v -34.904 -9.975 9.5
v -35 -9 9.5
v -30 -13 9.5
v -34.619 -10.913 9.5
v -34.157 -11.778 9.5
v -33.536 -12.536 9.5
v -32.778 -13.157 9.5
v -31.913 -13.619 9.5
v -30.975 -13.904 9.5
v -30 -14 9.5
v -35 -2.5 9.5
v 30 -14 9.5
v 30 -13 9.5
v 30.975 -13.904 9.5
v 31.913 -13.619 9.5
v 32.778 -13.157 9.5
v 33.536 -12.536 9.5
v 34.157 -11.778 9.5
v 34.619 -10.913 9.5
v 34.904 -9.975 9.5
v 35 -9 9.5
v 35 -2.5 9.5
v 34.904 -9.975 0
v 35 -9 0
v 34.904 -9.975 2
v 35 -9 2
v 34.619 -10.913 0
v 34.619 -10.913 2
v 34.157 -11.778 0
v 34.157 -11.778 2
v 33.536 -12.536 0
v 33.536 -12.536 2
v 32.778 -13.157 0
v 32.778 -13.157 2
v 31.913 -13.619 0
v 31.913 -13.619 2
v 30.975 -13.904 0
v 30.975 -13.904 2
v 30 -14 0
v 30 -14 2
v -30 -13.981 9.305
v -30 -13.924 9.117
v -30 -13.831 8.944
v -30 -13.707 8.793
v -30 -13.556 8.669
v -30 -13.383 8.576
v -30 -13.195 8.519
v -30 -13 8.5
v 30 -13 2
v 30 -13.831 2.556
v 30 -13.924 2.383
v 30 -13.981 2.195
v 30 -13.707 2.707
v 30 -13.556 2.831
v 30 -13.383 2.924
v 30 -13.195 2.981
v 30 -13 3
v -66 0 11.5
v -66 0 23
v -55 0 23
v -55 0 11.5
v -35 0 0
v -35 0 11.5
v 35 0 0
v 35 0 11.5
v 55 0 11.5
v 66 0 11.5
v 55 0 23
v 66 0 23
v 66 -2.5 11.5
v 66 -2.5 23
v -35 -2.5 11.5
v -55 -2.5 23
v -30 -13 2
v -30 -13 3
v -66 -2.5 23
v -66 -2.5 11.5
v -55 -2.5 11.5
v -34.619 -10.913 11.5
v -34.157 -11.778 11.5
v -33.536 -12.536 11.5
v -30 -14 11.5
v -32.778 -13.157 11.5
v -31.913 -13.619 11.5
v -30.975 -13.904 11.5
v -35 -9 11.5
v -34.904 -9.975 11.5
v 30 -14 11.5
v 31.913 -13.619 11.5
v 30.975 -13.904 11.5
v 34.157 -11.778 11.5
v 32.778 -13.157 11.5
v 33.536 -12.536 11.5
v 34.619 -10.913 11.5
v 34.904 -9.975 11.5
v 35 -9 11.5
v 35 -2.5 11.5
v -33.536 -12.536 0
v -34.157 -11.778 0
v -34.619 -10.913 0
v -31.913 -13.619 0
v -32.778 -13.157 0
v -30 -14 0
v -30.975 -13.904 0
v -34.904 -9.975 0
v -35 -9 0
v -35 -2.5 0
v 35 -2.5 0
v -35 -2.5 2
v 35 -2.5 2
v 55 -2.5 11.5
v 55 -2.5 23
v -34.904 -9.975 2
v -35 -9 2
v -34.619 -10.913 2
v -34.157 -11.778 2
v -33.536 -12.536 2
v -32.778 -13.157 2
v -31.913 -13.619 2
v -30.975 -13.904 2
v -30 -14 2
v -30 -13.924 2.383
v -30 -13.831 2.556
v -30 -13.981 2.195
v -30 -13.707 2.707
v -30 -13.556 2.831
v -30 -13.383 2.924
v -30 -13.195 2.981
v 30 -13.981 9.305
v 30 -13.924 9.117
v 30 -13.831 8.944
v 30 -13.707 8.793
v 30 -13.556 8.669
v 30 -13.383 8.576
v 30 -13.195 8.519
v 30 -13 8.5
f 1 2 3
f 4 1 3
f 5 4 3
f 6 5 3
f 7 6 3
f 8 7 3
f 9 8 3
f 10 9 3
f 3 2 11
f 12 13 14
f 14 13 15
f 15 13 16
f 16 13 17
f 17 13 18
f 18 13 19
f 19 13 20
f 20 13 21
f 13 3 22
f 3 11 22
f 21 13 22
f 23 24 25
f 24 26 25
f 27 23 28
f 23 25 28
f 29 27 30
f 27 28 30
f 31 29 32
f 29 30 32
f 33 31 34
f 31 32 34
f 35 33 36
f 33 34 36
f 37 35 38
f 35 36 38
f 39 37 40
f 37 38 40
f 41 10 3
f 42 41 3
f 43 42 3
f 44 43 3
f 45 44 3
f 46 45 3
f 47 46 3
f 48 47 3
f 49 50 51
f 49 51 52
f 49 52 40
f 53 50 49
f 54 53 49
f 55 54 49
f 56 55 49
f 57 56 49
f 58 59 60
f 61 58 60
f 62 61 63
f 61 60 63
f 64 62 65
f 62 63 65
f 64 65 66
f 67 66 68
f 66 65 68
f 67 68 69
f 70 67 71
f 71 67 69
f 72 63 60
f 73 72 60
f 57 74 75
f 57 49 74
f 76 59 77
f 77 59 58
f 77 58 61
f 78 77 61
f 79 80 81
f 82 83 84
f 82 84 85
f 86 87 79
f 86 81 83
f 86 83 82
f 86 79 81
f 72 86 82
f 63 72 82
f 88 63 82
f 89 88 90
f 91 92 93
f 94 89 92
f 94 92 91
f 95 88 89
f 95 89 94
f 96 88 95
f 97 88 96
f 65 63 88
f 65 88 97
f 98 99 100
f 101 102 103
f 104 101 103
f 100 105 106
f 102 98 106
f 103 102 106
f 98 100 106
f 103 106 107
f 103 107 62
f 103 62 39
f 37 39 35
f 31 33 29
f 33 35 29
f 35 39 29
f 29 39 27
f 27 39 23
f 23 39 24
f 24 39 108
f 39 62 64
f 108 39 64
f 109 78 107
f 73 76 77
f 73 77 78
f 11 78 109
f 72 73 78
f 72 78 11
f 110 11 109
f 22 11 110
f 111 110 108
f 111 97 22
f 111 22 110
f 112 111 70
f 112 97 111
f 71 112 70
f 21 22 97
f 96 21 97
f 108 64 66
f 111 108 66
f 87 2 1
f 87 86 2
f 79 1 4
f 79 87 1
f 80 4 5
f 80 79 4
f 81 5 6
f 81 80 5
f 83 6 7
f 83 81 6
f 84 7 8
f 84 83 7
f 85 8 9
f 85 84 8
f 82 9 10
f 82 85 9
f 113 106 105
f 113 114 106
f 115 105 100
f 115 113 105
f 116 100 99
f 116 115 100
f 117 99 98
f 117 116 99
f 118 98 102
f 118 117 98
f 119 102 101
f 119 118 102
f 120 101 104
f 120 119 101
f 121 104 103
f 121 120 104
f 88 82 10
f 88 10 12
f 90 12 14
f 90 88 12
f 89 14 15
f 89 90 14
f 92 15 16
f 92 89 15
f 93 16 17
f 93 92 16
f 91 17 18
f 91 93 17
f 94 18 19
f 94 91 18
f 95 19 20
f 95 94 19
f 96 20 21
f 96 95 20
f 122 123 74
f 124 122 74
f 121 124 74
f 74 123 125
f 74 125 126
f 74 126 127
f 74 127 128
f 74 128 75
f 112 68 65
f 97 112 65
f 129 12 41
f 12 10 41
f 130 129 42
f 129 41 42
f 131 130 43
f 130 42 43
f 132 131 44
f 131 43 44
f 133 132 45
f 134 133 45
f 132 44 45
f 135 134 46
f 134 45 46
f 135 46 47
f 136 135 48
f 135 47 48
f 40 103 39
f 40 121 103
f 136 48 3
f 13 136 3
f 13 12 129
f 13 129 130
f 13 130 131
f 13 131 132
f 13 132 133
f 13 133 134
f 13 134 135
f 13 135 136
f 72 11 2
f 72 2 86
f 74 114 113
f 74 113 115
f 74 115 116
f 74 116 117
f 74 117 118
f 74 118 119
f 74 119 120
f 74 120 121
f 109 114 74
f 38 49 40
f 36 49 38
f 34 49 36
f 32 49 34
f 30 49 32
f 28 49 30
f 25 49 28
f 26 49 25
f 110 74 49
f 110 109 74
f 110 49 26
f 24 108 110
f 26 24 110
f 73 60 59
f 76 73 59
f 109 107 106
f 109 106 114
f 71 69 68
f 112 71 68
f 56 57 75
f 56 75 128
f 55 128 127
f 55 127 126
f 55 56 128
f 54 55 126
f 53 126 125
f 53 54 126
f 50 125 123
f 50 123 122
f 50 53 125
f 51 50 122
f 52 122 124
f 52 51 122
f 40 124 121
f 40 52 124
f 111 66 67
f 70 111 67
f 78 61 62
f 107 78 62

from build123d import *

# Parameters (mm, degrees)
F0_W     = 70
F0_H     = 7.5
F1_DEPTH = 2.5
F0_H_2   = 2
F2_DEPTH = 14
F4_DEPTH = 30
F5_R     = 5


with BuildPart() as f1:
    # F0 (on Front) → F1 (new body)
    with BuildSketch(Plane.XZ):
        Polygon((-55, 23), (-66, 23), (-66, 11.5), (-55, 11.5), (-35, 0), (-35, 2), (-35, 9.5), (-35, 11.5), align=None)
        Polygon((55, 23), (35, 11.5), (35, 9.5), (35, 2), (35, 0), (55, 11.5), (66, 11.5), (66, 23), align=None)
        with Locations((0, 5.75)):
            Rectangle(F0_W, F0_H)
    extrude(amount=F1_DEPTH)

    # F0 (on Front) → F2 (join)
    with BuildSketch(Plane.XZ):
        with Locations((0, 10.5)):
            Rectangle(F0_W, F0_H_2)
        with Locations((0, 1)):
            Rectangle(F0_W, F0_H_2)
    extrude(amount=F2_DEPTH)

    # F3 (on Right) → F4 (join, symmetric)
    with BuildSketch(Plane.YZ):
        with BuildLine():
            Line((-13, 9.5), (-14, 9.5))
            ThreePointArc((-14, 9.5), (-13.7071067812, 8.7928932188), (-13, 8.5))
            Line((-13, 8.5), (-13, 9.5))
        make_face()
        with BuildLine():
            Line((-13, 2), (-13, 3))
            ThreePointArc((-13, 3), (-13.7071067812, 2.7071067812), (-14, 2))
            Line((-14, 2), (-13, 2))
        make_face()
    extrude(amount=F4_DEPTH, both=True)

    # F5
    f5_edges = [f1.edges().sort_by_distance(p)[0] for p in [
        (35, -14, 10.5),
        (35, -14, 1),
        (-35, -14, 1),
        (-35, -14, 10.5),
    ]]
    fillet(f5_edges, radius=F5_R)


solid = f1.part
